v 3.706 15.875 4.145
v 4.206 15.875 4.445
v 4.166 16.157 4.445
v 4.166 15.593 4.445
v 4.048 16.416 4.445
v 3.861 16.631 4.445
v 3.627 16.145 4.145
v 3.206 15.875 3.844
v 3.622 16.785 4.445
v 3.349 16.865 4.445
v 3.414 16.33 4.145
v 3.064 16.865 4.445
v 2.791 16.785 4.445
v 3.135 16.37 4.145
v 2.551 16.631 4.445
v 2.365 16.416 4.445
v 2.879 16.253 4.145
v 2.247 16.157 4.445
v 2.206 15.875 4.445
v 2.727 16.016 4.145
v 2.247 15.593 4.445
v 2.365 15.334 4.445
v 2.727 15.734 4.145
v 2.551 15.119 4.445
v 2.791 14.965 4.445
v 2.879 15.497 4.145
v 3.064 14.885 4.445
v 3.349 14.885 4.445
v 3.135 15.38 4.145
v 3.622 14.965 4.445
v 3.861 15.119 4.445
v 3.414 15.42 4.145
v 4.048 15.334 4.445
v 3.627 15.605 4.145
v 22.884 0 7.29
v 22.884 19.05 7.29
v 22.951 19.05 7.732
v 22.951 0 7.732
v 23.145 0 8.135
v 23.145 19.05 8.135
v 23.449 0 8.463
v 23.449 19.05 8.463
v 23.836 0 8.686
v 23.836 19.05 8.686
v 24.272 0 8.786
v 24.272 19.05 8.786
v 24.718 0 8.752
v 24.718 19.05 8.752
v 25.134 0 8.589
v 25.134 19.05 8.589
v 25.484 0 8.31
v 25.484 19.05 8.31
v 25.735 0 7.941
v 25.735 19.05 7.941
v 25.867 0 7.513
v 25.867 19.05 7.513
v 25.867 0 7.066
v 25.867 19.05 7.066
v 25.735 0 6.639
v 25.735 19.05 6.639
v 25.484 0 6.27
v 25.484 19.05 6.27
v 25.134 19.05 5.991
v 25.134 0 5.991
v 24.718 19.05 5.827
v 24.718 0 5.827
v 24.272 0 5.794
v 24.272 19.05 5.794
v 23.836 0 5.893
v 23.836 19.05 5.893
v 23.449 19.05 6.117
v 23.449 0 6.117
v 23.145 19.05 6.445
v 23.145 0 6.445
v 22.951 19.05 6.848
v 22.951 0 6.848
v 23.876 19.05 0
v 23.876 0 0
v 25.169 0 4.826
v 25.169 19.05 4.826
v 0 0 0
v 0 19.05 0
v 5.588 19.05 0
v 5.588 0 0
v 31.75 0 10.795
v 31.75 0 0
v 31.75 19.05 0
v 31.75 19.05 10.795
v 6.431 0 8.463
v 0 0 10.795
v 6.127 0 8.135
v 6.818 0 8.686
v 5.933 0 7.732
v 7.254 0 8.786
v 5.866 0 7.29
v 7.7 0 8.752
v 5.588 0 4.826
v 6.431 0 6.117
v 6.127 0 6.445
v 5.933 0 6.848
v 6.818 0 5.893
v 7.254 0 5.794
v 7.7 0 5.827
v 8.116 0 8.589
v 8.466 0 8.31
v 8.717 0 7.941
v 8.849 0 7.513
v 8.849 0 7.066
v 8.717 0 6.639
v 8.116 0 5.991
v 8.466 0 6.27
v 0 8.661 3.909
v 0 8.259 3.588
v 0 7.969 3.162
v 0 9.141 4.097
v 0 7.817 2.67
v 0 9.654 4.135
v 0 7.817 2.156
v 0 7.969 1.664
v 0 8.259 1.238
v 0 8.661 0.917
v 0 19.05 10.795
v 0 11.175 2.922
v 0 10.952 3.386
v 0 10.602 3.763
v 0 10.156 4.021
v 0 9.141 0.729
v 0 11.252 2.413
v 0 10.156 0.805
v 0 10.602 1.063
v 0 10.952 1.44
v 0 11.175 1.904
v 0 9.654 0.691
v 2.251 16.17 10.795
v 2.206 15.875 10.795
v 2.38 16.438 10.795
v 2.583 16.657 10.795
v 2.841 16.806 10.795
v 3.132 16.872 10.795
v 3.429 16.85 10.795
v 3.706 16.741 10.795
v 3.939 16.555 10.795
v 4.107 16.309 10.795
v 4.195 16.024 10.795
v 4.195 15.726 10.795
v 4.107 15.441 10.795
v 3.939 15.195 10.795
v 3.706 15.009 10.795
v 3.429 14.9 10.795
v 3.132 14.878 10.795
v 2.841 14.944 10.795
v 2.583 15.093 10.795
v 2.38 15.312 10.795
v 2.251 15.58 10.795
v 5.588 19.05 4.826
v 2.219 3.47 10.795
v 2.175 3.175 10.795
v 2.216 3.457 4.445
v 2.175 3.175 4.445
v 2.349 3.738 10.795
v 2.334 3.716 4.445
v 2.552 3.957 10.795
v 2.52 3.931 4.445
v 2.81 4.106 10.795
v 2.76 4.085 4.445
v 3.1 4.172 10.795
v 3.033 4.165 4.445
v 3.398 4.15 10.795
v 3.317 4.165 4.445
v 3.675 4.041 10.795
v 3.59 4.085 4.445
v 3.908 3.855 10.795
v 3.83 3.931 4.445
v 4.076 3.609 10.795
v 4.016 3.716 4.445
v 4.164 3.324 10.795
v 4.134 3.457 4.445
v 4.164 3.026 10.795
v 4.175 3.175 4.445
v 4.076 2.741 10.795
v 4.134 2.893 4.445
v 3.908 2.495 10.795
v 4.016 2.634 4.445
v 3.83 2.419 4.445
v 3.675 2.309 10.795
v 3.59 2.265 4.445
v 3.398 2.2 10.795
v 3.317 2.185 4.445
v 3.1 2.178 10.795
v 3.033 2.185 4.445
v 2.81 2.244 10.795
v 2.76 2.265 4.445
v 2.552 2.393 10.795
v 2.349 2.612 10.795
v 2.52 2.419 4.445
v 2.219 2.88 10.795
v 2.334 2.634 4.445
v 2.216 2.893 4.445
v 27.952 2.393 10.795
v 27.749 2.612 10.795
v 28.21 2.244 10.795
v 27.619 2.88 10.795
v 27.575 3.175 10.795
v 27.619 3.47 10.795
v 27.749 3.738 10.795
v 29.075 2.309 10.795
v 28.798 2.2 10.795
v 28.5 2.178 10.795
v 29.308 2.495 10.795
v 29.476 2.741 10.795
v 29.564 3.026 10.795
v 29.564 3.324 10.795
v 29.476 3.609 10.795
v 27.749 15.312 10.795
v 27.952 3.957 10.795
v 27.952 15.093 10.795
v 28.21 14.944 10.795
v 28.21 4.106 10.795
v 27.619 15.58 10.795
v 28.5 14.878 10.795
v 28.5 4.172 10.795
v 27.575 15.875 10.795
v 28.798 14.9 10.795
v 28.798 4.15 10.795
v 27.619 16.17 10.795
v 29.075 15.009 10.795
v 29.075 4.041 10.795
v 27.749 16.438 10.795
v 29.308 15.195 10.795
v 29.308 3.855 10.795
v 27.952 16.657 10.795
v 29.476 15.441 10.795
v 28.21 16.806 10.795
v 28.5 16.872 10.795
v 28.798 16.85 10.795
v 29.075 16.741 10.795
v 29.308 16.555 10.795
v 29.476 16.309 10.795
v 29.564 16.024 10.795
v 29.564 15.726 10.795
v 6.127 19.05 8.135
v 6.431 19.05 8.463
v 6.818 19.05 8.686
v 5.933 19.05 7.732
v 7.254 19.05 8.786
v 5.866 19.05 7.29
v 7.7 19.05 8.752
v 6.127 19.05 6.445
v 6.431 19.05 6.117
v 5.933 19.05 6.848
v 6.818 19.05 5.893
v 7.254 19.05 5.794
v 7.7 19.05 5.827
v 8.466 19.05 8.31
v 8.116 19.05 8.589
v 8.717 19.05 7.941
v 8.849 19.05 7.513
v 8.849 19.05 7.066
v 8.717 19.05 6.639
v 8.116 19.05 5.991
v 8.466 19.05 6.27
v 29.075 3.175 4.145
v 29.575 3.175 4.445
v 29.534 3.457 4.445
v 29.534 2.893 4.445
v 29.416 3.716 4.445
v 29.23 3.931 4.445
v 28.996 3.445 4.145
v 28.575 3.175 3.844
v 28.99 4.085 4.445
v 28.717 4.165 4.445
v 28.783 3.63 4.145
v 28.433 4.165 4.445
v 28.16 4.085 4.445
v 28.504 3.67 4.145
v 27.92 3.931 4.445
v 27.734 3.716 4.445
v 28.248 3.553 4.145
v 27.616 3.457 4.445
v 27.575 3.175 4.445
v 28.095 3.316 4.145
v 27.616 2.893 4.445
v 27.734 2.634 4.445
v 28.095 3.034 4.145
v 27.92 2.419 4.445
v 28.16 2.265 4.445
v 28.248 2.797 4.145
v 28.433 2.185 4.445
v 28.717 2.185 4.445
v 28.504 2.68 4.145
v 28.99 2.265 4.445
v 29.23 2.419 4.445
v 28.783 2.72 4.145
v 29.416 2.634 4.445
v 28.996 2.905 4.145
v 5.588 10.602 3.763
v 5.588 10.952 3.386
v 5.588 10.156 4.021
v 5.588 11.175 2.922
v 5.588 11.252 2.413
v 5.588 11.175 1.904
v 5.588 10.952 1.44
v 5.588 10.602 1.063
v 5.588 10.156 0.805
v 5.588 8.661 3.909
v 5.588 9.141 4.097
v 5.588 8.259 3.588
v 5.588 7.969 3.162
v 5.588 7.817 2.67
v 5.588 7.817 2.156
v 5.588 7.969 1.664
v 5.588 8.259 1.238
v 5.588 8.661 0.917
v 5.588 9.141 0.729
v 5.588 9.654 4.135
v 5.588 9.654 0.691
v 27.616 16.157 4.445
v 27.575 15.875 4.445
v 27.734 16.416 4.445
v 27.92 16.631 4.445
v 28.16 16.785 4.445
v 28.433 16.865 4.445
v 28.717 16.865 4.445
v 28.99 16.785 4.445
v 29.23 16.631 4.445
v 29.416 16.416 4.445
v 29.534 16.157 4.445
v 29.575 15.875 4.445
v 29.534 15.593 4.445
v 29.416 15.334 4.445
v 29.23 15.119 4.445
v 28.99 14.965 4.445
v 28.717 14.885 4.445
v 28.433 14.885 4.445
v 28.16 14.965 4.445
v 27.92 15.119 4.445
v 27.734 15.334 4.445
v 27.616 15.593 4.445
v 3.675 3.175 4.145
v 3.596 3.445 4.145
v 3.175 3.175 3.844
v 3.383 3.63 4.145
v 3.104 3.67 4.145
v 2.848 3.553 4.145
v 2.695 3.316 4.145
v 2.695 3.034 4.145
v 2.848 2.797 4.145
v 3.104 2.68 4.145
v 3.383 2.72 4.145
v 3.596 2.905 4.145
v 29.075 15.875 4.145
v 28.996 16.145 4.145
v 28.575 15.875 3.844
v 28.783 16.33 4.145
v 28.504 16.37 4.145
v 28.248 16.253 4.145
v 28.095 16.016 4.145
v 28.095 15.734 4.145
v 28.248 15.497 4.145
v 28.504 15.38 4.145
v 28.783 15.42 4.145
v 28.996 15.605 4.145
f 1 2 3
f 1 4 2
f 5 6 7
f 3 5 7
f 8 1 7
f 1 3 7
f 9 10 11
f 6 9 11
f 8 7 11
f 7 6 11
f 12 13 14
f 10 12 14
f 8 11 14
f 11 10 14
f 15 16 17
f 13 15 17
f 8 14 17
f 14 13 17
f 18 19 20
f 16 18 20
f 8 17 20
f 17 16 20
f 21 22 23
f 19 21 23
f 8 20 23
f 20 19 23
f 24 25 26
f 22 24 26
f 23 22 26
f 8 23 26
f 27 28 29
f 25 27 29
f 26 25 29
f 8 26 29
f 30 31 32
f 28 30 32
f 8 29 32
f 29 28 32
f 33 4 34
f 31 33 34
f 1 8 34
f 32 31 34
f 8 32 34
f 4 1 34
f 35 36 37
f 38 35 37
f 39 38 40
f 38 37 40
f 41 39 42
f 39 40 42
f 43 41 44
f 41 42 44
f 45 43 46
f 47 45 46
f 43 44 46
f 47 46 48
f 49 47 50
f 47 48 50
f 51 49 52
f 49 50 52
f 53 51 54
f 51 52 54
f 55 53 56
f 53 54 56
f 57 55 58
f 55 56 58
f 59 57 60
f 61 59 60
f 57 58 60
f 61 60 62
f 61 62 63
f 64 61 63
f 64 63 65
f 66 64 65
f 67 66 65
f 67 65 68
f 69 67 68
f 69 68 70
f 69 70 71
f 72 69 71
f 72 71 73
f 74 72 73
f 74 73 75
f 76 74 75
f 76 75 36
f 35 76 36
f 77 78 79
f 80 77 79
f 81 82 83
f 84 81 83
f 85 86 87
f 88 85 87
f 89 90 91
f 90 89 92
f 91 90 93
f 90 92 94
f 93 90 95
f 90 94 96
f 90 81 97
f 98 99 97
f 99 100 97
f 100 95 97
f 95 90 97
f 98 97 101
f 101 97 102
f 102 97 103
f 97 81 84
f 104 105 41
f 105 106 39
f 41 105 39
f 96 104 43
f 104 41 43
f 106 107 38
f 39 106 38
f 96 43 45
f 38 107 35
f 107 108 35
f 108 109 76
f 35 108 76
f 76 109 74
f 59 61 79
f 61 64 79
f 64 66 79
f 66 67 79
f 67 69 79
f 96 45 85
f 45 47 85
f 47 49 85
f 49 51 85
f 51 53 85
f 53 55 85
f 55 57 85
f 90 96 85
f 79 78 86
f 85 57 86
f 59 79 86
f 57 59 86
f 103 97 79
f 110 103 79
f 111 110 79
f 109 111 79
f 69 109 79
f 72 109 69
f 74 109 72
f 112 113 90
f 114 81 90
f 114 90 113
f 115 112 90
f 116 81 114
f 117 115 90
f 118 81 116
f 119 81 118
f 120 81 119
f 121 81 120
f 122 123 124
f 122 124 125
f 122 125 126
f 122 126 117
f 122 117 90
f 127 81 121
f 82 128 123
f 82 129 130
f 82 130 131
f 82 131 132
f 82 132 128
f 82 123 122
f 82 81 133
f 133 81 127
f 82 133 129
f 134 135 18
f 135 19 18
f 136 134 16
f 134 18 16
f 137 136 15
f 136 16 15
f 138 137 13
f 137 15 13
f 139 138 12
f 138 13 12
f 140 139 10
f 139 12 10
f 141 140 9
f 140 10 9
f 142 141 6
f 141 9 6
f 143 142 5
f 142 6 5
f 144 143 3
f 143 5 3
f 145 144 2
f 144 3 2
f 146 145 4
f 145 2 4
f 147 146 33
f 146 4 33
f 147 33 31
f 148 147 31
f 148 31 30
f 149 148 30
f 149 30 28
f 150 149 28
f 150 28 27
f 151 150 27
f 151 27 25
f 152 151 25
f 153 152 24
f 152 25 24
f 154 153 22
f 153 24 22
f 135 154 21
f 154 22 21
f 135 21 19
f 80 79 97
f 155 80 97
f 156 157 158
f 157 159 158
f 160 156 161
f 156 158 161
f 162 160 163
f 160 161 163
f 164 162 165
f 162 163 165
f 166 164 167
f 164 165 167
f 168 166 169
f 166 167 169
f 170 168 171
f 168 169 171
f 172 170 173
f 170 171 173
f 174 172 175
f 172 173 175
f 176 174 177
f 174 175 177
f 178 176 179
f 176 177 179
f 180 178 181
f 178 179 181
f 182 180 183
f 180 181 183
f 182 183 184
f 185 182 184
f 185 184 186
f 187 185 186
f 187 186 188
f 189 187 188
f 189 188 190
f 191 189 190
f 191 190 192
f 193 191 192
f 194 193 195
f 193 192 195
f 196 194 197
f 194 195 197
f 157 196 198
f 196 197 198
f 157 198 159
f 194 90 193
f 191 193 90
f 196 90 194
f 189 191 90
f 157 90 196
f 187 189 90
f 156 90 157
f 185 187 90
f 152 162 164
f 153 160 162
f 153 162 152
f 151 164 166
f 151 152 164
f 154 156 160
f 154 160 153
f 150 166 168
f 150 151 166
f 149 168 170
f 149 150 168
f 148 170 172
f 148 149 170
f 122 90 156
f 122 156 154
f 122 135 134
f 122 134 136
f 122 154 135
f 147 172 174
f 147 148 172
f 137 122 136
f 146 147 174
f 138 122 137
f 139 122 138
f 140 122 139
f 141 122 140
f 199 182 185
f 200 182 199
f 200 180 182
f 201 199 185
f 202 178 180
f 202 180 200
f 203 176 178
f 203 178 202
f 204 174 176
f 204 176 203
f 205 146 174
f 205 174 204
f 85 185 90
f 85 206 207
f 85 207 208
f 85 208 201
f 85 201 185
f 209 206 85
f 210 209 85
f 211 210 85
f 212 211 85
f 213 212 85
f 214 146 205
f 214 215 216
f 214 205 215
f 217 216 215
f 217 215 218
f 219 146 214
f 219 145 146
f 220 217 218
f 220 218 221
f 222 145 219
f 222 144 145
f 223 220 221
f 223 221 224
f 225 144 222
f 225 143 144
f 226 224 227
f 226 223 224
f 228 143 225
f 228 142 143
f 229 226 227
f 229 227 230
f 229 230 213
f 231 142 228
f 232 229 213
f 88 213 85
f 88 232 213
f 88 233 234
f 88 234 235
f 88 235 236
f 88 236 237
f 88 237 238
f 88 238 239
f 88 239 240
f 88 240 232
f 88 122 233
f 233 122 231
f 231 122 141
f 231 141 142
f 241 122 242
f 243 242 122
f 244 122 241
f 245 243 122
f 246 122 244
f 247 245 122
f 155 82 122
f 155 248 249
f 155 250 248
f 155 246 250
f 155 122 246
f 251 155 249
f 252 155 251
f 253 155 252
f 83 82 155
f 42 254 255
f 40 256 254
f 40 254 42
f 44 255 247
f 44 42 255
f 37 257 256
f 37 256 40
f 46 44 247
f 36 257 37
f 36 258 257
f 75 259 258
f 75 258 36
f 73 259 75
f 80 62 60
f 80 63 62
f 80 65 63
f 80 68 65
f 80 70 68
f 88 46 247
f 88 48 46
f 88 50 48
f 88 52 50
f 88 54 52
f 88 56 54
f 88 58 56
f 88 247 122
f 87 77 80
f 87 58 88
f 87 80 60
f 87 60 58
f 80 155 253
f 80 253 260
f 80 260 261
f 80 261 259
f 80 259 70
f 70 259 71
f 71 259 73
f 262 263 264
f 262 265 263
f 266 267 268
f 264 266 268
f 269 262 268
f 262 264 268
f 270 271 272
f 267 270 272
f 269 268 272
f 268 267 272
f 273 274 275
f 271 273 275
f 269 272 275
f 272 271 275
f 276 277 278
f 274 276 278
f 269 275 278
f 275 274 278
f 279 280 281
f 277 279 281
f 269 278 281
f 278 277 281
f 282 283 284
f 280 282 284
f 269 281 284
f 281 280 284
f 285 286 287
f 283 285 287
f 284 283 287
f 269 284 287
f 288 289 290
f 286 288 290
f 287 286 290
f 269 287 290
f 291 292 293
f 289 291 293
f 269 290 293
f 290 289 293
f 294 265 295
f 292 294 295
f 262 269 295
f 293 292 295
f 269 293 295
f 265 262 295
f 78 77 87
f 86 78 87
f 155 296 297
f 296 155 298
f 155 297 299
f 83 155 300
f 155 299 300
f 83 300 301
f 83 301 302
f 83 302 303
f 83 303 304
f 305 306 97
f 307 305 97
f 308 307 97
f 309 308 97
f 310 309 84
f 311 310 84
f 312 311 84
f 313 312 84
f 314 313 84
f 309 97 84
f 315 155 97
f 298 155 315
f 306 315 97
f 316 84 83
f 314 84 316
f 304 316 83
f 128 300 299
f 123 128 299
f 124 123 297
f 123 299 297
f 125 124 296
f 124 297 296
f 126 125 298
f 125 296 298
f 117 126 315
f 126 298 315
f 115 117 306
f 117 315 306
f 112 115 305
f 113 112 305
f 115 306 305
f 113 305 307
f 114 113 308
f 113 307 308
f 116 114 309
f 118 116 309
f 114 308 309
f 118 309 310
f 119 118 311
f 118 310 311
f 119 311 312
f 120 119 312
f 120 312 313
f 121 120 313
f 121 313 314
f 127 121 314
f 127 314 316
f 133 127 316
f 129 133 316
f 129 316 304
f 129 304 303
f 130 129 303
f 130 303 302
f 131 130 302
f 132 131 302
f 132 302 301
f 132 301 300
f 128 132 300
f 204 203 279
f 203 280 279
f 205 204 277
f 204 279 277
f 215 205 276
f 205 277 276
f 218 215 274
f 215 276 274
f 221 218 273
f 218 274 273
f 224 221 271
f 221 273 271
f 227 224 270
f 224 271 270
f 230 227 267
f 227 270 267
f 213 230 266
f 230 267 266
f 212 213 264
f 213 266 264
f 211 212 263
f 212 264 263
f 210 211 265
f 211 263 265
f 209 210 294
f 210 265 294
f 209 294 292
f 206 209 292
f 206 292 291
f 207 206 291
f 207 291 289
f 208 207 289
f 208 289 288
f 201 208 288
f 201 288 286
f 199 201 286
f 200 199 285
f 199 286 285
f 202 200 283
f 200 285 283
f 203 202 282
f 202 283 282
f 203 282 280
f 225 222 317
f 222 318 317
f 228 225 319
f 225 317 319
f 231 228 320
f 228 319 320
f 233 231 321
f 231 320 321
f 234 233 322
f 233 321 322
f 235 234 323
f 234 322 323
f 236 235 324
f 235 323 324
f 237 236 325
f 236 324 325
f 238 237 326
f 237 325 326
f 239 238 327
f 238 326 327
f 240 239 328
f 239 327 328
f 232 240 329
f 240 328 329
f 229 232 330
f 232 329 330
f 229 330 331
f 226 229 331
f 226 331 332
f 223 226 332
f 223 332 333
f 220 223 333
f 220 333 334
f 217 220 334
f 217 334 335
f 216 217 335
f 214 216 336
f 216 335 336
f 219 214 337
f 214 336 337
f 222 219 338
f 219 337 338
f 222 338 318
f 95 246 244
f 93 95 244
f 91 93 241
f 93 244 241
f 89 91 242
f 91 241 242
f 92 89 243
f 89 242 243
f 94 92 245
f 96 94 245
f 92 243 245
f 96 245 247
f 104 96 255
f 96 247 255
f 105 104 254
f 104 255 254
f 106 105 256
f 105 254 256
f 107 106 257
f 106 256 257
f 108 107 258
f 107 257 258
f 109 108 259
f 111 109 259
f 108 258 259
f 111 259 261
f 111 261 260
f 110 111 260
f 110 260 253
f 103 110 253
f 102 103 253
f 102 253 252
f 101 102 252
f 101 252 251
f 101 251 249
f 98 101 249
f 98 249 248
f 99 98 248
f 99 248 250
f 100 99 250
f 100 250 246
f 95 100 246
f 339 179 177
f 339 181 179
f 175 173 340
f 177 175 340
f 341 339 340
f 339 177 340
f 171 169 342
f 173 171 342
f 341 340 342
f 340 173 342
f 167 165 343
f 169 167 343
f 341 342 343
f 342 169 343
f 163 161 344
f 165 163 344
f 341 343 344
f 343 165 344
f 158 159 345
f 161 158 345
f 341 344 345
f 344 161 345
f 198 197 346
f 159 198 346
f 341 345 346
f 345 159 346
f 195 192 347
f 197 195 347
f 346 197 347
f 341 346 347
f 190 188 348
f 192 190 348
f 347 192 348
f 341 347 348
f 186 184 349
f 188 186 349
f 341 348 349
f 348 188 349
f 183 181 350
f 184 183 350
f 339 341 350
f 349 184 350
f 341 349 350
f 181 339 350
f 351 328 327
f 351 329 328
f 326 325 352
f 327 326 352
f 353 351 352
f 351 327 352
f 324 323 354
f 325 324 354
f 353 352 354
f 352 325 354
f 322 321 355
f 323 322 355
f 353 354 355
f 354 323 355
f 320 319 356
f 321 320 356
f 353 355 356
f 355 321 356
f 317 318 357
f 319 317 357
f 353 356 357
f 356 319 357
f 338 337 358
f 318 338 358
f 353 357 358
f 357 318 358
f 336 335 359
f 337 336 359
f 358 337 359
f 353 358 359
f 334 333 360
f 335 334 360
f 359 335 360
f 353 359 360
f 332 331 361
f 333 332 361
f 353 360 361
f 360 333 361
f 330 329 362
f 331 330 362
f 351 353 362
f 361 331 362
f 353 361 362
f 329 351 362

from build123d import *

# Parameters (mm, degrees)
F0_W     = 31.75
F0_H     = 19.05
F1_DEPTH = 10.795
F3_DEPTH = 25.4
F5_D     = 3
F7_D     = 2
F7_DEPTH = 6.35
F7_TIP   = 0.600860619
F9_D     = 3.4544
F9_DEPTH = 6.35
F9_TIP   = 1.0378064612


with BuildPart() as f1:
    # F0 (on Top) → F1 (new body)
    with BuildSketch(Plane.XY):
        with Locations((15.875, 9.525)):
            Rectangle(F0_W, F0_H)
    extrude(amount=F1_DEPTH)

    # F2 (on face) → F3 (cut)
    with BuildSketch(Plane.XZ):
        Polygon((23.876, 0), (25.1691228027, 4.826), (5.588, 4.826), (5.588, 0), align=None)
    extrude(amount=-F3_DEPTH, mode=Mode.SUBTRACT)

    # F5 (through all)
    with Locations(Plane.XZ):
        with Locations((7.366, 7.2898), (24.384, 7.2898)):
            Hole(F5_D / 2)

    # F7
    with Locations(Plane.XY.offset(10.795)):
        with Locations((3.2063322142, 15.875), (3.175, 3.175), (28.575, 15.875), (28.575, 3.175)):
            Hole(F7_D / 2, depth=F7_DEPTH)
            with Locations((0, 0, -(F7_DEPTH + F7_TIP / 2))):  # 118° drill point
                Cone(0, F7_D / 2, F7_TIP, mode=Mode.SUBTRACT)

    # F9
    with Locations(Plane(origin=(0, 0, 0), x_dir=(0, -1, 0), z_dir=(-1, 0, 0))):
        with Locations((-9.525, 2.413)):
            Hole(F9_D / 2, depth=F9_DEPTH)
            with Locations((0, 0, -(F9_DEPTH + F9_TIP / 2))):  # 118° drill point
                Cone(0, F9_D / 2, F9_TIP, mode=Mode.SUBTRACT)


solid = f1.part
